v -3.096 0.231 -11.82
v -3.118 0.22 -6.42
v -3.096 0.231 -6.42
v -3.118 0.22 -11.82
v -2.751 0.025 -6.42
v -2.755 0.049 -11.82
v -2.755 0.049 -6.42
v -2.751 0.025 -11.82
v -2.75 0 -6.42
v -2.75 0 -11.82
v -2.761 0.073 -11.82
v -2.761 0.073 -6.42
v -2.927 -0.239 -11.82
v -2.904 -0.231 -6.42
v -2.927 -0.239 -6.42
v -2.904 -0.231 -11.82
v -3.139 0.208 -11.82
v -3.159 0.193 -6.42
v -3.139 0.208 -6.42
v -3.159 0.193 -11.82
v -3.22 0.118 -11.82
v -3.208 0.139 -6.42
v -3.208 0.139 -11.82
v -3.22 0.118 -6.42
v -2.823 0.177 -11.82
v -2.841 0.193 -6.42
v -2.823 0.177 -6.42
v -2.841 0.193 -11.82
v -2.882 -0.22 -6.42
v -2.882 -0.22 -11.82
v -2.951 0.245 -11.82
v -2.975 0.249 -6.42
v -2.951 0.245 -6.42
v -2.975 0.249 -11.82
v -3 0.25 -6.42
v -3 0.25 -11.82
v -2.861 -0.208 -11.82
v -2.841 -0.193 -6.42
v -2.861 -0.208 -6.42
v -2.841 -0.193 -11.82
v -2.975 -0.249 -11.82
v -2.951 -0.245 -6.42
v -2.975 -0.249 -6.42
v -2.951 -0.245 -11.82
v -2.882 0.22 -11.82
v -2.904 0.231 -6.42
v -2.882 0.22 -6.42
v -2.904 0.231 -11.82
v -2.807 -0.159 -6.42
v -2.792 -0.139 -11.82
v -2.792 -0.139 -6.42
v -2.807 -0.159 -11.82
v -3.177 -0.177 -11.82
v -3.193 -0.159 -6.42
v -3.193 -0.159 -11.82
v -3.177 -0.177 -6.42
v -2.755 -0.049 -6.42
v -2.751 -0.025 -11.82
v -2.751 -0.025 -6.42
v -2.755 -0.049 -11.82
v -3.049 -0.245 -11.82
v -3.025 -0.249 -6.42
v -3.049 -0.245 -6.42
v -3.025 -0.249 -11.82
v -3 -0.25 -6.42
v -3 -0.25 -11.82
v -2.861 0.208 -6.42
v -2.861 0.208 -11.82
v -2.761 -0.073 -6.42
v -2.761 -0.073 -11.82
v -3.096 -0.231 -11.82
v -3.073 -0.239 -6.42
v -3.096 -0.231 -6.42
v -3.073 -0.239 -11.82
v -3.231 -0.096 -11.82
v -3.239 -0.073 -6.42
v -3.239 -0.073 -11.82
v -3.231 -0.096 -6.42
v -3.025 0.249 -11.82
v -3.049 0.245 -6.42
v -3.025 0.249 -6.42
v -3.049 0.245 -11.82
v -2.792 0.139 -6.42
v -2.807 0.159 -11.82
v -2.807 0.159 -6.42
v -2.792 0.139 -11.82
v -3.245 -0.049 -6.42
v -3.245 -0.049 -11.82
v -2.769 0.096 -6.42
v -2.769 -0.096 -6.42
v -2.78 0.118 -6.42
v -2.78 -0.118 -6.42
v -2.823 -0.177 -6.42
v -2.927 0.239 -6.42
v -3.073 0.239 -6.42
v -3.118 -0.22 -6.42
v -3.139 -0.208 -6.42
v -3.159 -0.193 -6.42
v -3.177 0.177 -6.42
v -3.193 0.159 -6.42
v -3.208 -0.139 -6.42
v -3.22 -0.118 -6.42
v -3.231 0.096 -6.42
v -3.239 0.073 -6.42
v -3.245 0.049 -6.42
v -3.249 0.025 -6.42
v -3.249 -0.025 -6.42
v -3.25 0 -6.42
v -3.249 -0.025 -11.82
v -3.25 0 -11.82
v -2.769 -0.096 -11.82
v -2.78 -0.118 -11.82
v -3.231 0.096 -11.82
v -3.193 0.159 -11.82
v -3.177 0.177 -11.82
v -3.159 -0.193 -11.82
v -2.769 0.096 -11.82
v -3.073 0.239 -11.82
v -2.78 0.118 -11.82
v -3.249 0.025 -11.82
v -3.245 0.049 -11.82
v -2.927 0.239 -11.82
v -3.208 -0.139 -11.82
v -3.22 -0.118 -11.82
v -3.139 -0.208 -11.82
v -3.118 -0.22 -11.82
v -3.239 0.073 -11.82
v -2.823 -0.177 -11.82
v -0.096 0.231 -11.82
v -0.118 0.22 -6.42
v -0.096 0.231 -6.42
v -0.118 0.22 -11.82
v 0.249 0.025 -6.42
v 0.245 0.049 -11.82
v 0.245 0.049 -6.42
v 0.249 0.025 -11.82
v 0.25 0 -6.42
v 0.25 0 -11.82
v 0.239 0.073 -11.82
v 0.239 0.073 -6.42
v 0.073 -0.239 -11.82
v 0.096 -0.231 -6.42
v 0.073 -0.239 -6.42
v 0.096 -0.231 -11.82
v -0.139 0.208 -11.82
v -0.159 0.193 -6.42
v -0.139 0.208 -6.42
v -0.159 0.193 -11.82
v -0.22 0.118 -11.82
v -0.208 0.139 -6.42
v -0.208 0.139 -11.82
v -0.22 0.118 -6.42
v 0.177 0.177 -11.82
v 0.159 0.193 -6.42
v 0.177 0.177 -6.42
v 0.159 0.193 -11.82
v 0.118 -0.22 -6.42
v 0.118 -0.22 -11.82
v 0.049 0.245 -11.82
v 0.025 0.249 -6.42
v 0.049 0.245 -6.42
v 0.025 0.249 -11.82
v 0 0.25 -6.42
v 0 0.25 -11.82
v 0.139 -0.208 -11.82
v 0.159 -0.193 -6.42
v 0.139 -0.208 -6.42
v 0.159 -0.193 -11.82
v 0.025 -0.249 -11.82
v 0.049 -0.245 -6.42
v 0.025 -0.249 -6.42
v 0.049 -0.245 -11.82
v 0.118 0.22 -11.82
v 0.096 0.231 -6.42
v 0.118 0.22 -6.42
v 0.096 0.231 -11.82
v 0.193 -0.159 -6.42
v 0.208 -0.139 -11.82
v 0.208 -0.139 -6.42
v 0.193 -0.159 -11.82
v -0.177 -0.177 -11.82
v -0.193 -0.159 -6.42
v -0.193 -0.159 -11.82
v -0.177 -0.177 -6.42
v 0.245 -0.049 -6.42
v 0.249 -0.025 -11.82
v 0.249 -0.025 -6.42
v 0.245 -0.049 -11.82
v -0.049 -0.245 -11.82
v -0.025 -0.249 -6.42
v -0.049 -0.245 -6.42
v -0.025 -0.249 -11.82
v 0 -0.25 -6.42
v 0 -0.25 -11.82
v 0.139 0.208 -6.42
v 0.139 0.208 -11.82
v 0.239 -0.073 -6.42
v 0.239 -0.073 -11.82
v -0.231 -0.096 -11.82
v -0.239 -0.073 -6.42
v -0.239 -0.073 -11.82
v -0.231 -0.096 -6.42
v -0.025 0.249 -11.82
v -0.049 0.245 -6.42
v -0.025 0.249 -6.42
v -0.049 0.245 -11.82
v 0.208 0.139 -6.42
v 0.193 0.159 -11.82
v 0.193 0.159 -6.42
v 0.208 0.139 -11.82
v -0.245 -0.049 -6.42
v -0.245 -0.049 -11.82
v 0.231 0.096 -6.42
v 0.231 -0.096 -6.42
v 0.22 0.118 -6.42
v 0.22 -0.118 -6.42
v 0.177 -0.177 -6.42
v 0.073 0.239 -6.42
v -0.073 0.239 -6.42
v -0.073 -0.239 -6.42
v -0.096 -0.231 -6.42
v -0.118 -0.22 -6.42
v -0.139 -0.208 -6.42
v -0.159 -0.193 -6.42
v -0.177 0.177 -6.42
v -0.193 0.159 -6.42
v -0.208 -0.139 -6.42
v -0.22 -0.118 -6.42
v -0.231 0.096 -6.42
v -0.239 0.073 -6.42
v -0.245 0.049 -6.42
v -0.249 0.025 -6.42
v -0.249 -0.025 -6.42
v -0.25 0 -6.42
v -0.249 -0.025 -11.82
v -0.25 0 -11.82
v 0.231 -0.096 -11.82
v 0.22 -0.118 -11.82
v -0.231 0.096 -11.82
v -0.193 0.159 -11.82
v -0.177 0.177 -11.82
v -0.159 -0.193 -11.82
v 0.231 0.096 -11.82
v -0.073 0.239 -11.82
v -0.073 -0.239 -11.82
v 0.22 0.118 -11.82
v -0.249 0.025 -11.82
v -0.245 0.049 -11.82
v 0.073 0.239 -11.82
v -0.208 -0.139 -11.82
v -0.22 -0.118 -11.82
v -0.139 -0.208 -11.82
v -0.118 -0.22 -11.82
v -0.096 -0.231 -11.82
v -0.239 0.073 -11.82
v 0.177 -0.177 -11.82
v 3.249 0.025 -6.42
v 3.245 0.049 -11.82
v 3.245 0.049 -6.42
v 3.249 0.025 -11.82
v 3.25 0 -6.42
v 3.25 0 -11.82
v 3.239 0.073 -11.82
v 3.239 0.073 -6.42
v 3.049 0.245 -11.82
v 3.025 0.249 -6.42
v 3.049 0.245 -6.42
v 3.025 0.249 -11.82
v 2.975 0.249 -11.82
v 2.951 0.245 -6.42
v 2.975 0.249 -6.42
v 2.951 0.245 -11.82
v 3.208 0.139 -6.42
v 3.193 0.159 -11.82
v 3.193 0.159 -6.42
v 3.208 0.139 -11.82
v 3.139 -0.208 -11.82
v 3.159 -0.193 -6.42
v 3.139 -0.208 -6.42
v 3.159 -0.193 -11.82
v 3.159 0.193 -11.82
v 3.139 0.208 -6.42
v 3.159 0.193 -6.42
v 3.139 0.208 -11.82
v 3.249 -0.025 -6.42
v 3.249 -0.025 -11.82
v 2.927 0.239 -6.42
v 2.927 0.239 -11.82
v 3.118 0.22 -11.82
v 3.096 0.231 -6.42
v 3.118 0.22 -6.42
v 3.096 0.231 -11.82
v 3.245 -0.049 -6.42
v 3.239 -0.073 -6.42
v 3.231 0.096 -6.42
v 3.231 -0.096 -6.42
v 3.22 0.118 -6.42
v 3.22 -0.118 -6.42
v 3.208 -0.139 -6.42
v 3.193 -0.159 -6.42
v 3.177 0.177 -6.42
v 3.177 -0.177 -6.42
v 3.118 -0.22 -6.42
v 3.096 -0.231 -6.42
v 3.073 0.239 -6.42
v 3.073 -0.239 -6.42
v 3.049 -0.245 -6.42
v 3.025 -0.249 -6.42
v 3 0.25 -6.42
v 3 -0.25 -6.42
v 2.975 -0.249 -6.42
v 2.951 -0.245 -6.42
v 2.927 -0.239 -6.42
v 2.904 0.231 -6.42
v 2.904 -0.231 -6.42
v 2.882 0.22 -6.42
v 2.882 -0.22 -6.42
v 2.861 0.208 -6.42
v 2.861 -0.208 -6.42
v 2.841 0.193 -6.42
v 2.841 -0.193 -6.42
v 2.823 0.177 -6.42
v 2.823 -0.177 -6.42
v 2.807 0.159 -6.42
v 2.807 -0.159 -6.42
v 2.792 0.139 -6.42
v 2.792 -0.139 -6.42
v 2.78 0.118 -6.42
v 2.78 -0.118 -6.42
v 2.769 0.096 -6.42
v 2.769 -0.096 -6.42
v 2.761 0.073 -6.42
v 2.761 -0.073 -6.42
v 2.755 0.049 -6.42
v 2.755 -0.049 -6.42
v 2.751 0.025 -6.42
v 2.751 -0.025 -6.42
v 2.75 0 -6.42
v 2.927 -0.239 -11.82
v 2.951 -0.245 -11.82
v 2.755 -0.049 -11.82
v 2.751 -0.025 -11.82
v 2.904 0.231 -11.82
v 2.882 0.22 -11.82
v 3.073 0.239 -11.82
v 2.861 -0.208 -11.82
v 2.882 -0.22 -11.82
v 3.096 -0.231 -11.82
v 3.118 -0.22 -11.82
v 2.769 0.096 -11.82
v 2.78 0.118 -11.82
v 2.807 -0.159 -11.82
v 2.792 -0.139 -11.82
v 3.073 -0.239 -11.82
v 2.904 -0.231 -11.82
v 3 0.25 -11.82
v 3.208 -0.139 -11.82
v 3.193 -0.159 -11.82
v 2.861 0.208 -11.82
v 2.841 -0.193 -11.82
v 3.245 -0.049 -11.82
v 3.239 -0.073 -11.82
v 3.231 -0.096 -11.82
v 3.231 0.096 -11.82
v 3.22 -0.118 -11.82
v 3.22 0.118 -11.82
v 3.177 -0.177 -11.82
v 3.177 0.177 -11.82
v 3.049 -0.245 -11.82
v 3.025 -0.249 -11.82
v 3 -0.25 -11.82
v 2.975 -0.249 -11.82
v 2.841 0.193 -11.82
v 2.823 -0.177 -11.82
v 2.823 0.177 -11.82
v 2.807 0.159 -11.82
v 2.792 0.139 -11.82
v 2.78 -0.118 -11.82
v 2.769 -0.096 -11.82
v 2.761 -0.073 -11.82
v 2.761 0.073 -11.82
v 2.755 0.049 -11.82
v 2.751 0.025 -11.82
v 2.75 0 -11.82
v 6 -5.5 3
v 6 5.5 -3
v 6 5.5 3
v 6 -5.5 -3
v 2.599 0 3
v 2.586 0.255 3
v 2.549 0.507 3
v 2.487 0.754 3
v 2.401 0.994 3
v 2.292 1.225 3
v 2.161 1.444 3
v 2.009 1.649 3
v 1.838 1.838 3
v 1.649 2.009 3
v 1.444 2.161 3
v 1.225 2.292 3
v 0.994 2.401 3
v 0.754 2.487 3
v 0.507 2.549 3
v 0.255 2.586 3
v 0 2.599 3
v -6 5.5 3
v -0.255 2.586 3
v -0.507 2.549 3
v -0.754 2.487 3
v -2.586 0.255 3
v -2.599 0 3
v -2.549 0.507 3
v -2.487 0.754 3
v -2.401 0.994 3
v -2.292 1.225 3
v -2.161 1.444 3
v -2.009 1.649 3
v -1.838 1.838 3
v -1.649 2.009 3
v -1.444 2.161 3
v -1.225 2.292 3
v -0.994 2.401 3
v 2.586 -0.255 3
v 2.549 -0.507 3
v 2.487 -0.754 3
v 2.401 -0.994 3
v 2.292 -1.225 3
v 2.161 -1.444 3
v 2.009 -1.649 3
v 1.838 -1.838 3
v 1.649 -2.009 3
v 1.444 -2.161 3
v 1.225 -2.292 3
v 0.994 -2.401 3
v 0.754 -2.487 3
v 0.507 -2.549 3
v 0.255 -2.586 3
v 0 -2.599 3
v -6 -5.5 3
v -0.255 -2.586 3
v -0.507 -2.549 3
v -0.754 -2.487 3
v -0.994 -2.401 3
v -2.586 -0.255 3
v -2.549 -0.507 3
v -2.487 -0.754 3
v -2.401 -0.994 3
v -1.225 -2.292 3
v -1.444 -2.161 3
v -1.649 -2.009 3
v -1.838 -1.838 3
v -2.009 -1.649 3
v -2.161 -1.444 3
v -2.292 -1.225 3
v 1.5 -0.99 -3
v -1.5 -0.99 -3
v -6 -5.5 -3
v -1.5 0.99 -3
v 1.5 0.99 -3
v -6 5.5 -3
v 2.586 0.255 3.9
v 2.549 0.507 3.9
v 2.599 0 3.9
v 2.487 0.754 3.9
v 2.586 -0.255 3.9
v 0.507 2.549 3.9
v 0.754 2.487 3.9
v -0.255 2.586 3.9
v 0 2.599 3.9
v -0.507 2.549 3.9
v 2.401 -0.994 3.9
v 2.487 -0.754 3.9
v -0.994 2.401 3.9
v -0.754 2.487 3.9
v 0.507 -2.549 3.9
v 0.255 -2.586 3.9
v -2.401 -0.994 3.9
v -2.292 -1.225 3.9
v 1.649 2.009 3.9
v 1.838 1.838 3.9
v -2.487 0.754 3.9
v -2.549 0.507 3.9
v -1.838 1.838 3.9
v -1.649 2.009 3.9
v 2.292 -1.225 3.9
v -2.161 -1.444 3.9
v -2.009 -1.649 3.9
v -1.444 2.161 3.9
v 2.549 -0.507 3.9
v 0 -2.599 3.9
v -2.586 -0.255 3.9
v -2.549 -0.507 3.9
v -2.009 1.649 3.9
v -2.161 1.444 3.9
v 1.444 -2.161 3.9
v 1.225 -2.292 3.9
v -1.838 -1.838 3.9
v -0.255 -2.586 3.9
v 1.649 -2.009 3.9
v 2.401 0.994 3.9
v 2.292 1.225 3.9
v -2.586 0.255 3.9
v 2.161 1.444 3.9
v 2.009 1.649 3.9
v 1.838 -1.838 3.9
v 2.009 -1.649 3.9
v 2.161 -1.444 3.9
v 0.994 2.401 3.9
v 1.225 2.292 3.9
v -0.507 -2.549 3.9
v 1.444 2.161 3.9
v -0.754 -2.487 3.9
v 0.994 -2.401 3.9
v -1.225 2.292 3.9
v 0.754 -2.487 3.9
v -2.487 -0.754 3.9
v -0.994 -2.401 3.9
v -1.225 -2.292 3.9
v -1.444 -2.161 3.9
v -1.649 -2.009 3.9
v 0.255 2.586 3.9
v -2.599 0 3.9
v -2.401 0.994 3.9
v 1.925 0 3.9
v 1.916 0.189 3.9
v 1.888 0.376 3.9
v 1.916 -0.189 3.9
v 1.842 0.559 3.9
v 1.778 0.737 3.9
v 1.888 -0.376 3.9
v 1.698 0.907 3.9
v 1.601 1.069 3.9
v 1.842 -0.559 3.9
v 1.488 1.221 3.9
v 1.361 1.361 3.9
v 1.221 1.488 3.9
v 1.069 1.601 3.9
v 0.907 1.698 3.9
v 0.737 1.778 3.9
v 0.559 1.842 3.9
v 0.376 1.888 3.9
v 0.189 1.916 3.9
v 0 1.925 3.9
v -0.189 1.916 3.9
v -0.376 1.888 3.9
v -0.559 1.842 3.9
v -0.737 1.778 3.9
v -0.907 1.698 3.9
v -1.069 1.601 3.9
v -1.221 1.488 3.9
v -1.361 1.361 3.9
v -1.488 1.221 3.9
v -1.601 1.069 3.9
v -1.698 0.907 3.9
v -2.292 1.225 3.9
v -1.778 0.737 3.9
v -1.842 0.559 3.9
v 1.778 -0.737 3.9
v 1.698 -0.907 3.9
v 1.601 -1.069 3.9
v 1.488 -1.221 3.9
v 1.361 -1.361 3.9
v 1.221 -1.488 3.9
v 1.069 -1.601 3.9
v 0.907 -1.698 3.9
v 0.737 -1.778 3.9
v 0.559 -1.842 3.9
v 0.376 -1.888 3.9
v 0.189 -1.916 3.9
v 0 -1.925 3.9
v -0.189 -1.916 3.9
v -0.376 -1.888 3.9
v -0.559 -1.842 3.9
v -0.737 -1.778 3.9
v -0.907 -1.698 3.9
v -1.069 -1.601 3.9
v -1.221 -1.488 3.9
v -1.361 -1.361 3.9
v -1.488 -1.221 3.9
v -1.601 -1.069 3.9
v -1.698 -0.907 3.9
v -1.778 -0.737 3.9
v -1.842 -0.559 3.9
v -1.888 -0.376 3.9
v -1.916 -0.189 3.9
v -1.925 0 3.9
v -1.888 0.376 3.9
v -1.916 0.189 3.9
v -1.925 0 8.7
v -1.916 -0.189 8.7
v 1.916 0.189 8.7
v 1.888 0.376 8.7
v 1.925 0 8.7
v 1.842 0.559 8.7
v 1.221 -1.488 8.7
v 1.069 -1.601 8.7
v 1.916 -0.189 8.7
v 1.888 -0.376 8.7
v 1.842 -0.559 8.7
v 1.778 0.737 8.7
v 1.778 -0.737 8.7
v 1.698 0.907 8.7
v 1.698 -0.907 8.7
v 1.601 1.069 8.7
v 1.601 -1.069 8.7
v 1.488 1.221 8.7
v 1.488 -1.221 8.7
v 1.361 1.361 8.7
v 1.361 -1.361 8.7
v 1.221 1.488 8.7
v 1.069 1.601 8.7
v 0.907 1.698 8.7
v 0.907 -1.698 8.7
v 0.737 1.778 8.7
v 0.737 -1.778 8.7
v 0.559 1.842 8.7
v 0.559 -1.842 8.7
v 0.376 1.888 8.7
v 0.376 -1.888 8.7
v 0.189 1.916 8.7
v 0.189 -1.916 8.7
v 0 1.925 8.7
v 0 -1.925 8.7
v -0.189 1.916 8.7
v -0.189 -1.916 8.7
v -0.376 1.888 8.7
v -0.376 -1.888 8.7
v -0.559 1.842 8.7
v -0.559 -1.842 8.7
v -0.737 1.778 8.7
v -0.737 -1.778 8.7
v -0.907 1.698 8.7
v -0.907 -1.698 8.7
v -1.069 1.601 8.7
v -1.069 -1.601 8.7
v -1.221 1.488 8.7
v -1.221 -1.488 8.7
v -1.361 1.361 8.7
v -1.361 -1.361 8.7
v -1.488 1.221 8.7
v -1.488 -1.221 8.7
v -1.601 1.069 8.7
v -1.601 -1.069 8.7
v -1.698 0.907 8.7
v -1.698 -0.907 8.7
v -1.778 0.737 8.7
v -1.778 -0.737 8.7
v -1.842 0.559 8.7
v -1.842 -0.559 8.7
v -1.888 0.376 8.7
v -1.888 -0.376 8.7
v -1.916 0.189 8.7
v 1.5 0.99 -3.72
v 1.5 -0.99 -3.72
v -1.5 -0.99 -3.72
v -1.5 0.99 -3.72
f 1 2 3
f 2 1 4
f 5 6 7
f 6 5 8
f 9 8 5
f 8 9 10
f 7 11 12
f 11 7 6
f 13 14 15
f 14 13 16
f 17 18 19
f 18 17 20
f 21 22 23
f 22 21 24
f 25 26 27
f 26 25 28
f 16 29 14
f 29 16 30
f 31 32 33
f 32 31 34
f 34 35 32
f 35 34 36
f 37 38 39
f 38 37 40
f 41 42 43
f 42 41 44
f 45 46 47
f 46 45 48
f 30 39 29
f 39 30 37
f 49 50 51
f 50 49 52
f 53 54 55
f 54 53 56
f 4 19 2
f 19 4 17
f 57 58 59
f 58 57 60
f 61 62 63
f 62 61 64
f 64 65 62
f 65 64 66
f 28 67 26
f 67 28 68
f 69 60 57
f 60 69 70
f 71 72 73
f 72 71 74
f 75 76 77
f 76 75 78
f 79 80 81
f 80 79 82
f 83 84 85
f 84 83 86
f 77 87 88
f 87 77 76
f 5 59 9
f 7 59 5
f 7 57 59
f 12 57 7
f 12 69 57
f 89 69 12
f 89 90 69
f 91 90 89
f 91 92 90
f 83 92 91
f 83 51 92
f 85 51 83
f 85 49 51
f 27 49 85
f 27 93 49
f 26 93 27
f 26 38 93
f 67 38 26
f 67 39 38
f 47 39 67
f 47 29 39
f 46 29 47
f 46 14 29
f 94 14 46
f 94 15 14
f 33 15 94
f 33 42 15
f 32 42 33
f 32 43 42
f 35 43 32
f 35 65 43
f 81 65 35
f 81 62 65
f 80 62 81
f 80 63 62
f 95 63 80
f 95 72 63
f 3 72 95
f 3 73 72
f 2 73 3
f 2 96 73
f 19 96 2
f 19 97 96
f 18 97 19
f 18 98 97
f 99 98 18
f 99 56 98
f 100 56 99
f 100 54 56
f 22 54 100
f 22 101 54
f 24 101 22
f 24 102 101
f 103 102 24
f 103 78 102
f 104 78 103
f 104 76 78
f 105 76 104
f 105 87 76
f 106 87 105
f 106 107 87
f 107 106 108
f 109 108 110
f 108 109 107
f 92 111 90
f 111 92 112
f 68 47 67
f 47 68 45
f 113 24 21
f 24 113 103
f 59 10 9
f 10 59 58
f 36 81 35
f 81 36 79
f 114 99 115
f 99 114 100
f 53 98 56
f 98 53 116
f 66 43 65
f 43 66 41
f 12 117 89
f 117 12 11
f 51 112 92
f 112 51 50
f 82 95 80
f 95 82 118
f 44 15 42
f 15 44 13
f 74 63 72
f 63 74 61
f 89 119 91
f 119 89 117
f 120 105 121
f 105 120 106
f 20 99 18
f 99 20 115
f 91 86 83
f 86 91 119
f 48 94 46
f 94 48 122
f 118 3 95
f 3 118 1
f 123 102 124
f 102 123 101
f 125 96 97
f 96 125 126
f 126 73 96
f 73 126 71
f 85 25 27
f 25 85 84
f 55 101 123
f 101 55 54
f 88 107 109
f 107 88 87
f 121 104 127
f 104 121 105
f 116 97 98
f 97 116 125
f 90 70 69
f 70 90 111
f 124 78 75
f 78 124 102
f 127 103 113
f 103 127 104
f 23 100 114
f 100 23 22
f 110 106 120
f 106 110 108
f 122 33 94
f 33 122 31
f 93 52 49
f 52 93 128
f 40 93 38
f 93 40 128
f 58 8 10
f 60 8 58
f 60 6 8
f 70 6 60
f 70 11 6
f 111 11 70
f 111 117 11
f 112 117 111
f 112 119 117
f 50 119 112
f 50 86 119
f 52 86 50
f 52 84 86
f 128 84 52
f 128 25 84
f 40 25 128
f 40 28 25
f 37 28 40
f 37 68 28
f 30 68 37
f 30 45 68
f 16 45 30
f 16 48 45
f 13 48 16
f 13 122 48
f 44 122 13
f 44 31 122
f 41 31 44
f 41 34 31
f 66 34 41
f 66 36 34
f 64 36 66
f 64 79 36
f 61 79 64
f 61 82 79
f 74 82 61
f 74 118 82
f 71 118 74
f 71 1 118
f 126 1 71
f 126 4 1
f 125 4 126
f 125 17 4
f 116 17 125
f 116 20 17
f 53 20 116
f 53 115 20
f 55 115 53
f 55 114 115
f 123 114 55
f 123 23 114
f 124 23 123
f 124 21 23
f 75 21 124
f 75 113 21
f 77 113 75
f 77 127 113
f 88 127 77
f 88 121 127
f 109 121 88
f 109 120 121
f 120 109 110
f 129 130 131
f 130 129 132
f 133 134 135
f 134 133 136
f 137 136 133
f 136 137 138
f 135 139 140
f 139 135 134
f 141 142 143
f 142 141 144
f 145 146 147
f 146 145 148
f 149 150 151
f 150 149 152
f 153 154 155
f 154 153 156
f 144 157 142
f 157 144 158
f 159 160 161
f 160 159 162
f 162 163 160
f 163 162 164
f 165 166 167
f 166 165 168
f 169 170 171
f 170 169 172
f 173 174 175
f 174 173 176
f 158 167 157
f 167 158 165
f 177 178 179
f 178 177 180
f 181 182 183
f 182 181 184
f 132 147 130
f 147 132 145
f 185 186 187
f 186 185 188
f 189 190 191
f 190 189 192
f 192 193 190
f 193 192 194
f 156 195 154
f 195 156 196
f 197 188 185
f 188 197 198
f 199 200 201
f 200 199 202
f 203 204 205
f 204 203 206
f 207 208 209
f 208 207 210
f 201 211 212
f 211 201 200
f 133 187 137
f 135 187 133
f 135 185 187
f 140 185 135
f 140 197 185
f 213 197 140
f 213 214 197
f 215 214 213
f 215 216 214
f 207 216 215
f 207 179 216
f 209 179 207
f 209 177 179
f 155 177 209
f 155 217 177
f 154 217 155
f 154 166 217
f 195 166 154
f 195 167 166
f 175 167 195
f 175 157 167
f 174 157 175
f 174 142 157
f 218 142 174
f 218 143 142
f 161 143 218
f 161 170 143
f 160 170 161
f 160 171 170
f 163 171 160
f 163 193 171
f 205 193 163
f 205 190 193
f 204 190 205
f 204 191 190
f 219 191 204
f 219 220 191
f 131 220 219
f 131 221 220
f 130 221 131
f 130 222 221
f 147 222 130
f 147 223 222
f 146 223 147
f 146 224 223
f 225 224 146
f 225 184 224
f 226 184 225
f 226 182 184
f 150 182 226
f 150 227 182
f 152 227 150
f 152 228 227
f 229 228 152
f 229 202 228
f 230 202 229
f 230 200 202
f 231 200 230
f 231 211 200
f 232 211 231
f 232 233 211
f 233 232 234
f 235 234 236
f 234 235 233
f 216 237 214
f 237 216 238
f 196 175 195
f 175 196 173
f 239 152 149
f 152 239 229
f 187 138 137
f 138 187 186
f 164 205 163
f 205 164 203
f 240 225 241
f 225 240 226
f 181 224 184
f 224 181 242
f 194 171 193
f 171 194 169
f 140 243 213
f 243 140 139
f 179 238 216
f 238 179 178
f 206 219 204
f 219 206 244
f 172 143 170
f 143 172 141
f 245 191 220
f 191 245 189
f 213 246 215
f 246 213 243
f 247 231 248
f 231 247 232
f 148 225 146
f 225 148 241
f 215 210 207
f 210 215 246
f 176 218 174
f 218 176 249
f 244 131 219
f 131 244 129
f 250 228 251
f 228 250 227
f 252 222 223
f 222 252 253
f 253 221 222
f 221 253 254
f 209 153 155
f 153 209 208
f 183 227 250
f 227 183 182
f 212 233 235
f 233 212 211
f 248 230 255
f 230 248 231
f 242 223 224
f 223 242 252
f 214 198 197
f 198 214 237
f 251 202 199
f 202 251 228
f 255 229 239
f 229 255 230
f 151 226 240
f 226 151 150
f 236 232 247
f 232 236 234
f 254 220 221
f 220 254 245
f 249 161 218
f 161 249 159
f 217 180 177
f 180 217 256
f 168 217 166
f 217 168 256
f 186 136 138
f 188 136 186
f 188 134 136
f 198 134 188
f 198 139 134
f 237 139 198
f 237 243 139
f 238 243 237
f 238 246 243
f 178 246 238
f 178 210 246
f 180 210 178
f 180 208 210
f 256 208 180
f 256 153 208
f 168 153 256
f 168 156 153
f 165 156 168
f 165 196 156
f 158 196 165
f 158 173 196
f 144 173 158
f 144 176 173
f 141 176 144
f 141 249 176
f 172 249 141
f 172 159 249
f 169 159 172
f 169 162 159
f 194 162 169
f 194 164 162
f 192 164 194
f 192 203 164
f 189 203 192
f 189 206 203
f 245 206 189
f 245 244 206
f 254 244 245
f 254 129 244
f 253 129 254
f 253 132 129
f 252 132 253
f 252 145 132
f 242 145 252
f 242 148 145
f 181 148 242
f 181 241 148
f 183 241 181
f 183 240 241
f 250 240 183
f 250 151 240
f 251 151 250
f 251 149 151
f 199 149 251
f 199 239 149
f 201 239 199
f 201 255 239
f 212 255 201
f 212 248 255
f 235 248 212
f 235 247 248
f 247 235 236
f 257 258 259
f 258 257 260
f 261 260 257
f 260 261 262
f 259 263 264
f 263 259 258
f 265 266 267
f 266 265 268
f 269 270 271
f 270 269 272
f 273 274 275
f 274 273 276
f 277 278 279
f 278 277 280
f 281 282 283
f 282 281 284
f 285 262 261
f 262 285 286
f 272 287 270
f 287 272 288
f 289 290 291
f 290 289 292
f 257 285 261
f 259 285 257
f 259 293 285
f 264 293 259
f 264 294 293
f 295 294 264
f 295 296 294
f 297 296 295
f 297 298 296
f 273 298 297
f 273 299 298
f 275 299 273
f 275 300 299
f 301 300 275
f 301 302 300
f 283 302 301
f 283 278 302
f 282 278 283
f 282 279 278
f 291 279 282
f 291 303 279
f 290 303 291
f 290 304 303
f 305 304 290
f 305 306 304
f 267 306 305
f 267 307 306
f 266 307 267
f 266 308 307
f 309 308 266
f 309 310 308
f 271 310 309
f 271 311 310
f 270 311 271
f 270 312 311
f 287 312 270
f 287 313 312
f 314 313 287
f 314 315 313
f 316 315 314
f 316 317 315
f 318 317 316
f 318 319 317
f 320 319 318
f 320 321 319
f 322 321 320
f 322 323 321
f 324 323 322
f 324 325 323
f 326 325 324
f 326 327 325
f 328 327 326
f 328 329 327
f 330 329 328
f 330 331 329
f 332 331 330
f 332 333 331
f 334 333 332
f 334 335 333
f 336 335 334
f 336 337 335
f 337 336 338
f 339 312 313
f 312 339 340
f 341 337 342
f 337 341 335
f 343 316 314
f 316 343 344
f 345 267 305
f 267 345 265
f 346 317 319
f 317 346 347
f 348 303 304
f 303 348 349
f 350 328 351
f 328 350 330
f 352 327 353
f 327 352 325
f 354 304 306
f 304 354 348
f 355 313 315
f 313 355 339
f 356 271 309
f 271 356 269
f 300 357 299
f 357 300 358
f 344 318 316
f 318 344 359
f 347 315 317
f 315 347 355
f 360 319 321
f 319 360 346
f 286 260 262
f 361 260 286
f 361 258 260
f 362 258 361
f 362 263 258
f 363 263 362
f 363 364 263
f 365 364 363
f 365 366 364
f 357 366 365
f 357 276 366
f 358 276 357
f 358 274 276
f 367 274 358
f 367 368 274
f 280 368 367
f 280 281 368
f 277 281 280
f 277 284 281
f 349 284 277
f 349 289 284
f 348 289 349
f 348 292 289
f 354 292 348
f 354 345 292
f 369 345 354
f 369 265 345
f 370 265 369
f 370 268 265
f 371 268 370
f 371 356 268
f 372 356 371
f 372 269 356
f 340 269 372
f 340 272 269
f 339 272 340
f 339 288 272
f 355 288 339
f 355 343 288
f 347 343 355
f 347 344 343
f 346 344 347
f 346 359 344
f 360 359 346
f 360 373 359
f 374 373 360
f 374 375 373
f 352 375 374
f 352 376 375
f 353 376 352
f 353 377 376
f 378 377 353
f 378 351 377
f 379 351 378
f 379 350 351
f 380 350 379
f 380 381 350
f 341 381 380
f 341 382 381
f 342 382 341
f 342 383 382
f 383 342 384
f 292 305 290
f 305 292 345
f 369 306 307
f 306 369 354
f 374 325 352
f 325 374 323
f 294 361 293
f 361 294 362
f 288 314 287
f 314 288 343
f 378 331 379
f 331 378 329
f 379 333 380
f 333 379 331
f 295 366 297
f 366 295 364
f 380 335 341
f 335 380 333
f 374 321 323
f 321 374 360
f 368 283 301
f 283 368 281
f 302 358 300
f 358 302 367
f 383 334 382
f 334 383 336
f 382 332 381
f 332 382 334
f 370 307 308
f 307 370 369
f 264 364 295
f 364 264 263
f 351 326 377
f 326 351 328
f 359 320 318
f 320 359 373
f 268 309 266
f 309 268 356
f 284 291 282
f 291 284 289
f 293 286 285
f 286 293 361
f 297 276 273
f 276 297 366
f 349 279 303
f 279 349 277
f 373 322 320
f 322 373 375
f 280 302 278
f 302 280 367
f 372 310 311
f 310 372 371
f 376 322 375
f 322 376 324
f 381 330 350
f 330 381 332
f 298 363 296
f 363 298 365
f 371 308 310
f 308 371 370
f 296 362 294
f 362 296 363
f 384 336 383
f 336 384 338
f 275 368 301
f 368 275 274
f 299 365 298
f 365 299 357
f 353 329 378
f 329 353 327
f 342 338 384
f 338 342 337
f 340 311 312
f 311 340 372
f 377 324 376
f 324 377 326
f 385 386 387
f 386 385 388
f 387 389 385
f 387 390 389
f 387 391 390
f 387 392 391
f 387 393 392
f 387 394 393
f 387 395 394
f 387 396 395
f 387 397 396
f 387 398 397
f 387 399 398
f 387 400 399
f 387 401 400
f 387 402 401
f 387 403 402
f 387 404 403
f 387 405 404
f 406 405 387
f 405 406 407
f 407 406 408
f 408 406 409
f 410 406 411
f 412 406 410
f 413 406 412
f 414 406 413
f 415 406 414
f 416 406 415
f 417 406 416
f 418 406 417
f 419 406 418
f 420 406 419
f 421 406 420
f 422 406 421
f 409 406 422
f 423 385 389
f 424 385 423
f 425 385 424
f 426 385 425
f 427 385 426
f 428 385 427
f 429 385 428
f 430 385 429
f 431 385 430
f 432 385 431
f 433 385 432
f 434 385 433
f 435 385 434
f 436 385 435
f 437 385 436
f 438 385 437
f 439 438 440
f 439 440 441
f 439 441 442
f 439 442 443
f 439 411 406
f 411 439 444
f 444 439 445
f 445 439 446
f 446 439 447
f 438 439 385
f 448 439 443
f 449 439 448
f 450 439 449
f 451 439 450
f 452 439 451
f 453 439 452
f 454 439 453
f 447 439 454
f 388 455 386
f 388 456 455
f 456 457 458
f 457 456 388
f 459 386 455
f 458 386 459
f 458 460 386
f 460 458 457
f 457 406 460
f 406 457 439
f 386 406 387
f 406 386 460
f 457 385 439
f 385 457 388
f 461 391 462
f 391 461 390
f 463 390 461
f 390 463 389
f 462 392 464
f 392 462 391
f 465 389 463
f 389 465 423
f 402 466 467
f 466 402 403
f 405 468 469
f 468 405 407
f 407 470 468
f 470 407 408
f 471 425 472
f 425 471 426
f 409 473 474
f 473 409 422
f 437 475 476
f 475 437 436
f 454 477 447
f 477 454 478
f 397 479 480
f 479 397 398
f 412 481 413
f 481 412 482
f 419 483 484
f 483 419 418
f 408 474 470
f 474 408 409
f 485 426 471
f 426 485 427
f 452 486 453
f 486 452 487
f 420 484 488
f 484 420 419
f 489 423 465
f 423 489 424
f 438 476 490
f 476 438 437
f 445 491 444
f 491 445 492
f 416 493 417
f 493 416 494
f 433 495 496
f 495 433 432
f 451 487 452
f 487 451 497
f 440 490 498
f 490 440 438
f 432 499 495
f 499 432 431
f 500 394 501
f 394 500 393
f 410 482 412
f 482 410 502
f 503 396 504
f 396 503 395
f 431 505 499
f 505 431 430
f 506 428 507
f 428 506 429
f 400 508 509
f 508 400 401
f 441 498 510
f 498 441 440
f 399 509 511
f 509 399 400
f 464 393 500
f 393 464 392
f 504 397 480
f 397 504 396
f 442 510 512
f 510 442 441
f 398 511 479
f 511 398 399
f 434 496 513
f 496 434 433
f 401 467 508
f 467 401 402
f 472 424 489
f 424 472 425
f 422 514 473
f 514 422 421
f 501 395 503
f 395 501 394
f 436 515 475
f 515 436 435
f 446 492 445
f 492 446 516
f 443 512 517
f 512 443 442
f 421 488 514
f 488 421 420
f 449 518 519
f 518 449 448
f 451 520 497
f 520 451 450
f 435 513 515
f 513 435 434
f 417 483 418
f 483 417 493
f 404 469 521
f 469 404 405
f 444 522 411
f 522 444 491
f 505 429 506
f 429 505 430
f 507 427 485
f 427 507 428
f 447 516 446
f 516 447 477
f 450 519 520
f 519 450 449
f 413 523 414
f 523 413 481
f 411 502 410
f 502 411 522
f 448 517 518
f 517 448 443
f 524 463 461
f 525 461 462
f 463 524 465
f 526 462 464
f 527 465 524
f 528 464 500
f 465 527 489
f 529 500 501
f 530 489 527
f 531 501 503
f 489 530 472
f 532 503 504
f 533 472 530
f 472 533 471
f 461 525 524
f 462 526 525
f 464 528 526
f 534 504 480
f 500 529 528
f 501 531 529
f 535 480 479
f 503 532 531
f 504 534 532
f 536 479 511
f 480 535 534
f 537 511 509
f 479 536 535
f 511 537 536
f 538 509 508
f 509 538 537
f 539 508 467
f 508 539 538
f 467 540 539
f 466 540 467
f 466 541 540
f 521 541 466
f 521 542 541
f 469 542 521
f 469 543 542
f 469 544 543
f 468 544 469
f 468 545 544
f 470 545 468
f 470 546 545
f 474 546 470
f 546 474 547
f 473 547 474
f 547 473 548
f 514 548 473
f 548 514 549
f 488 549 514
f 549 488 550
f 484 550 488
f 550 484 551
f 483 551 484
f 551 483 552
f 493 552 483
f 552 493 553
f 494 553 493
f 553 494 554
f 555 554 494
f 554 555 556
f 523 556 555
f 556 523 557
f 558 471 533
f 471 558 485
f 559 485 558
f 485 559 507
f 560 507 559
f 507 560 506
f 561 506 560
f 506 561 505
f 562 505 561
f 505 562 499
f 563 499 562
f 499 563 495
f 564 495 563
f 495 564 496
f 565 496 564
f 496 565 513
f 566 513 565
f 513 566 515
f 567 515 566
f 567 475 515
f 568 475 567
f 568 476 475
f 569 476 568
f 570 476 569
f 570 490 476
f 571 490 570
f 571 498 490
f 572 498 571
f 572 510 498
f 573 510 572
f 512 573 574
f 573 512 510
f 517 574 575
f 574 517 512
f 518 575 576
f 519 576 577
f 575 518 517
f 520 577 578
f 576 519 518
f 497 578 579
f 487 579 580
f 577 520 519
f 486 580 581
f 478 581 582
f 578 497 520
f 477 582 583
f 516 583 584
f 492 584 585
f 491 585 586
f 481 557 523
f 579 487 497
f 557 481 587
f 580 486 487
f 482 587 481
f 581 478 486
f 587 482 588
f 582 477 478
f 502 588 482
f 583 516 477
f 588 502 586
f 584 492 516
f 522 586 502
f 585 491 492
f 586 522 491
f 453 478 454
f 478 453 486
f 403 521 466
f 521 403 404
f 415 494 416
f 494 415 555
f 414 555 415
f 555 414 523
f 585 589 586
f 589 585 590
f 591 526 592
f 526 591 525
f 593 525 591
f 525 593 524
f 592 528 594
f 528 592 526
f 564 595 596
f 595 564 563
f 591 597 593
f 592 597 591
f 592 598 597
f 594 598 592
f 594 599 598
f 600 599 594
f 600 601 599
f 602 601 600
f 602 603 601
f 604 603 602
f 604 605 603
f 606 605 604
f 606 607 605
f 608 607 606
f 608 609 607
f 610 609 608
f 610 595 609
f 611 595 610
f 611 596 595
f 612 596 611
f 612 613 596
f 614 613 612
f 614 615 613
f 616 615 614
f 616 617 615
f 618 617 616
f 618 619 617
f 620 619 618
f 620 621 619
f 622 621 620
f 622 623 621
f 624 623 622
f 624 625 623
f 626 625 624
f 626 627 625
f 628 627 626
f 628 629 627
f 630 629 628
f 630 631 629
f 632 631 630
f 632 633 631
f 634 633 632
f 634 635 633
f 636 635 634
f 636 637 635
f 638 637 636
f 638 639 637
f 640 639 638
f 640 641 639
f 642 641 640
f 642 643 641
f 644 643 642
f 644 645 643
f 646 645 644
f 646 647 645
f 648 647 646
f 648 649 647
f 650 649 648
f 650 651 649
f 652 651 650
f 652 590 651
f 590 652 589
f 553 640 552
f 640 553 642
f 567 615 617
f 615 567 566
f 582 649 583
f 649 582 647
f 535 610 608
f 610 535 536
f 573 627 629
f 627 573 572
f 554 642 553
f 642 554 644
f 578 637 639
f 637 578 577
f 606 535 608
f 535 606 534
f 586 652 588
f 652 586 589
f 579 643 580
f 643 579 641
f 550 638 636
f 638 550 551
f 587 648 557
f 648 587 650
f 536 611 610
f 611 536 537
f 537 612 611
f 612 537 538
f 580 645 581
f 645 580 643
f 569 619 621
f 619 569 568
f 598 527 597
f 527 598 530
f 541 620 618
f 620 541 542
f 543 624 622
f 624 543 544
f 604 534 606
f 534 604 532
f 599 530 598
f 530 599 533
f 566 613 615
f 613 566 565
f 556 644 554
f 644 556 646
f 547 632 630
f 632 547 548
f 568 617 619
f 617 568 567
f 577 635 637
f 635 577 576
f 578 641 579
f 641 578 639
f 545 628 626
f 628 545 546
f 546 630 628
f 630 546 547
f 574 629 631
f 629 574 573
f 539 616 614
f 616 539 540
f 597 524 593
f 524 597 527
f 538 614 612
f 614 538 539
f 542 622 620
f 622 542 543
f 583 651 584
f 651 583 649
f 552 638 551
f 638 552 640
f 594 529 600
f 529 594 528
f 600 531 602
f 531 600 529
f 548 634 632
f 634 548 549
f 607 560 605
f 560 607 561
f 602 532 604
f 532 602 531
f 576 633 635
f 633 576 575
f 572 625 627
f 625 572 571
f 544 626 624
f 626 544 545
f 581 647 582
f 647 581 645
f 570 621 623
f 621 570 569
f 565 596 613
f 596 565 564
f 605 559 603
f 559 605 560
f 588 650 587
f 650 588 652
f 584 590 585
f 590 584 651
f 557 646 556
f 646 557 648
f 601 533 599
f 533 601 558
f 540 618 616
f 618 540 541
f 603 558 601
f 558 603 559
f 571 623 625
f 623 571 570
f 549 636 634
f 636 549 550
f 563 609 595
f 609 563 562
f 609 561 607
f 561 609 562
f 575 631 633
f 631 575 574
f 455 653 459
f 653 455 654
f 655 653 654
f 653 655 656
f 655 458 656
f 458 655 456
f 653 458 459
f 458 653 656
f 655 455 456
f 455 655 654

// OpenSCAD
$fn=64;

dims = [12, 11, 6, 0.5]; // [body_x, body_y, body_z, pin_d]

body_x = dims[0];
body_y = dims[1];
body_z = dims[2];
pin_d  = dims[3];

module pin(len=4, d=0.5){
    translate([0,0,-len/2])
        cylinder(h=len, d=d, center=true);
}

module potentiometer(body_x=12, body_y=11, body_z=6, pin_d=0.5){
    shaft_d = min(body_x, body_y)*0.35;
    shaft_h = body_z*0.8;
    collar_d = shaft_d*1.35;
    collar_h = body_z*0.15;

    lug_len = body_x*0.25;
    lug_w   = body_y*0.18;
    lug_t   = body_z*0.12;

    pin_len = body_z*0.9;

    union(){
        translate([0,0,0])
            cube([body_x, body_y, body_z], center=true);

        translate([0,0, body_z/2 + collar_h/2])
            cylinder(h=collar_h, d=collar_d, center=true);

        translate([0,0, body_z/2 + collar_h + shaft_h/2])
            cylinder(h=shaft_h, d=shaft_d, center=true);

        translate([0,0,-body_z/2 - lug_t/2])
            cube([lug_len, lug_w, lug_t], center=true);

        pin_spacing = body_x*0.25;
        for(i=[-1,0,1]){
            translate([i*pin_spacing, 0, -body_z/2 - lug_t - pin_len/2])
                pin(len=pin_len, d=pin_d);
        }
    }
}

potentiometer(body_x, body_y, body_z, pin_d);
